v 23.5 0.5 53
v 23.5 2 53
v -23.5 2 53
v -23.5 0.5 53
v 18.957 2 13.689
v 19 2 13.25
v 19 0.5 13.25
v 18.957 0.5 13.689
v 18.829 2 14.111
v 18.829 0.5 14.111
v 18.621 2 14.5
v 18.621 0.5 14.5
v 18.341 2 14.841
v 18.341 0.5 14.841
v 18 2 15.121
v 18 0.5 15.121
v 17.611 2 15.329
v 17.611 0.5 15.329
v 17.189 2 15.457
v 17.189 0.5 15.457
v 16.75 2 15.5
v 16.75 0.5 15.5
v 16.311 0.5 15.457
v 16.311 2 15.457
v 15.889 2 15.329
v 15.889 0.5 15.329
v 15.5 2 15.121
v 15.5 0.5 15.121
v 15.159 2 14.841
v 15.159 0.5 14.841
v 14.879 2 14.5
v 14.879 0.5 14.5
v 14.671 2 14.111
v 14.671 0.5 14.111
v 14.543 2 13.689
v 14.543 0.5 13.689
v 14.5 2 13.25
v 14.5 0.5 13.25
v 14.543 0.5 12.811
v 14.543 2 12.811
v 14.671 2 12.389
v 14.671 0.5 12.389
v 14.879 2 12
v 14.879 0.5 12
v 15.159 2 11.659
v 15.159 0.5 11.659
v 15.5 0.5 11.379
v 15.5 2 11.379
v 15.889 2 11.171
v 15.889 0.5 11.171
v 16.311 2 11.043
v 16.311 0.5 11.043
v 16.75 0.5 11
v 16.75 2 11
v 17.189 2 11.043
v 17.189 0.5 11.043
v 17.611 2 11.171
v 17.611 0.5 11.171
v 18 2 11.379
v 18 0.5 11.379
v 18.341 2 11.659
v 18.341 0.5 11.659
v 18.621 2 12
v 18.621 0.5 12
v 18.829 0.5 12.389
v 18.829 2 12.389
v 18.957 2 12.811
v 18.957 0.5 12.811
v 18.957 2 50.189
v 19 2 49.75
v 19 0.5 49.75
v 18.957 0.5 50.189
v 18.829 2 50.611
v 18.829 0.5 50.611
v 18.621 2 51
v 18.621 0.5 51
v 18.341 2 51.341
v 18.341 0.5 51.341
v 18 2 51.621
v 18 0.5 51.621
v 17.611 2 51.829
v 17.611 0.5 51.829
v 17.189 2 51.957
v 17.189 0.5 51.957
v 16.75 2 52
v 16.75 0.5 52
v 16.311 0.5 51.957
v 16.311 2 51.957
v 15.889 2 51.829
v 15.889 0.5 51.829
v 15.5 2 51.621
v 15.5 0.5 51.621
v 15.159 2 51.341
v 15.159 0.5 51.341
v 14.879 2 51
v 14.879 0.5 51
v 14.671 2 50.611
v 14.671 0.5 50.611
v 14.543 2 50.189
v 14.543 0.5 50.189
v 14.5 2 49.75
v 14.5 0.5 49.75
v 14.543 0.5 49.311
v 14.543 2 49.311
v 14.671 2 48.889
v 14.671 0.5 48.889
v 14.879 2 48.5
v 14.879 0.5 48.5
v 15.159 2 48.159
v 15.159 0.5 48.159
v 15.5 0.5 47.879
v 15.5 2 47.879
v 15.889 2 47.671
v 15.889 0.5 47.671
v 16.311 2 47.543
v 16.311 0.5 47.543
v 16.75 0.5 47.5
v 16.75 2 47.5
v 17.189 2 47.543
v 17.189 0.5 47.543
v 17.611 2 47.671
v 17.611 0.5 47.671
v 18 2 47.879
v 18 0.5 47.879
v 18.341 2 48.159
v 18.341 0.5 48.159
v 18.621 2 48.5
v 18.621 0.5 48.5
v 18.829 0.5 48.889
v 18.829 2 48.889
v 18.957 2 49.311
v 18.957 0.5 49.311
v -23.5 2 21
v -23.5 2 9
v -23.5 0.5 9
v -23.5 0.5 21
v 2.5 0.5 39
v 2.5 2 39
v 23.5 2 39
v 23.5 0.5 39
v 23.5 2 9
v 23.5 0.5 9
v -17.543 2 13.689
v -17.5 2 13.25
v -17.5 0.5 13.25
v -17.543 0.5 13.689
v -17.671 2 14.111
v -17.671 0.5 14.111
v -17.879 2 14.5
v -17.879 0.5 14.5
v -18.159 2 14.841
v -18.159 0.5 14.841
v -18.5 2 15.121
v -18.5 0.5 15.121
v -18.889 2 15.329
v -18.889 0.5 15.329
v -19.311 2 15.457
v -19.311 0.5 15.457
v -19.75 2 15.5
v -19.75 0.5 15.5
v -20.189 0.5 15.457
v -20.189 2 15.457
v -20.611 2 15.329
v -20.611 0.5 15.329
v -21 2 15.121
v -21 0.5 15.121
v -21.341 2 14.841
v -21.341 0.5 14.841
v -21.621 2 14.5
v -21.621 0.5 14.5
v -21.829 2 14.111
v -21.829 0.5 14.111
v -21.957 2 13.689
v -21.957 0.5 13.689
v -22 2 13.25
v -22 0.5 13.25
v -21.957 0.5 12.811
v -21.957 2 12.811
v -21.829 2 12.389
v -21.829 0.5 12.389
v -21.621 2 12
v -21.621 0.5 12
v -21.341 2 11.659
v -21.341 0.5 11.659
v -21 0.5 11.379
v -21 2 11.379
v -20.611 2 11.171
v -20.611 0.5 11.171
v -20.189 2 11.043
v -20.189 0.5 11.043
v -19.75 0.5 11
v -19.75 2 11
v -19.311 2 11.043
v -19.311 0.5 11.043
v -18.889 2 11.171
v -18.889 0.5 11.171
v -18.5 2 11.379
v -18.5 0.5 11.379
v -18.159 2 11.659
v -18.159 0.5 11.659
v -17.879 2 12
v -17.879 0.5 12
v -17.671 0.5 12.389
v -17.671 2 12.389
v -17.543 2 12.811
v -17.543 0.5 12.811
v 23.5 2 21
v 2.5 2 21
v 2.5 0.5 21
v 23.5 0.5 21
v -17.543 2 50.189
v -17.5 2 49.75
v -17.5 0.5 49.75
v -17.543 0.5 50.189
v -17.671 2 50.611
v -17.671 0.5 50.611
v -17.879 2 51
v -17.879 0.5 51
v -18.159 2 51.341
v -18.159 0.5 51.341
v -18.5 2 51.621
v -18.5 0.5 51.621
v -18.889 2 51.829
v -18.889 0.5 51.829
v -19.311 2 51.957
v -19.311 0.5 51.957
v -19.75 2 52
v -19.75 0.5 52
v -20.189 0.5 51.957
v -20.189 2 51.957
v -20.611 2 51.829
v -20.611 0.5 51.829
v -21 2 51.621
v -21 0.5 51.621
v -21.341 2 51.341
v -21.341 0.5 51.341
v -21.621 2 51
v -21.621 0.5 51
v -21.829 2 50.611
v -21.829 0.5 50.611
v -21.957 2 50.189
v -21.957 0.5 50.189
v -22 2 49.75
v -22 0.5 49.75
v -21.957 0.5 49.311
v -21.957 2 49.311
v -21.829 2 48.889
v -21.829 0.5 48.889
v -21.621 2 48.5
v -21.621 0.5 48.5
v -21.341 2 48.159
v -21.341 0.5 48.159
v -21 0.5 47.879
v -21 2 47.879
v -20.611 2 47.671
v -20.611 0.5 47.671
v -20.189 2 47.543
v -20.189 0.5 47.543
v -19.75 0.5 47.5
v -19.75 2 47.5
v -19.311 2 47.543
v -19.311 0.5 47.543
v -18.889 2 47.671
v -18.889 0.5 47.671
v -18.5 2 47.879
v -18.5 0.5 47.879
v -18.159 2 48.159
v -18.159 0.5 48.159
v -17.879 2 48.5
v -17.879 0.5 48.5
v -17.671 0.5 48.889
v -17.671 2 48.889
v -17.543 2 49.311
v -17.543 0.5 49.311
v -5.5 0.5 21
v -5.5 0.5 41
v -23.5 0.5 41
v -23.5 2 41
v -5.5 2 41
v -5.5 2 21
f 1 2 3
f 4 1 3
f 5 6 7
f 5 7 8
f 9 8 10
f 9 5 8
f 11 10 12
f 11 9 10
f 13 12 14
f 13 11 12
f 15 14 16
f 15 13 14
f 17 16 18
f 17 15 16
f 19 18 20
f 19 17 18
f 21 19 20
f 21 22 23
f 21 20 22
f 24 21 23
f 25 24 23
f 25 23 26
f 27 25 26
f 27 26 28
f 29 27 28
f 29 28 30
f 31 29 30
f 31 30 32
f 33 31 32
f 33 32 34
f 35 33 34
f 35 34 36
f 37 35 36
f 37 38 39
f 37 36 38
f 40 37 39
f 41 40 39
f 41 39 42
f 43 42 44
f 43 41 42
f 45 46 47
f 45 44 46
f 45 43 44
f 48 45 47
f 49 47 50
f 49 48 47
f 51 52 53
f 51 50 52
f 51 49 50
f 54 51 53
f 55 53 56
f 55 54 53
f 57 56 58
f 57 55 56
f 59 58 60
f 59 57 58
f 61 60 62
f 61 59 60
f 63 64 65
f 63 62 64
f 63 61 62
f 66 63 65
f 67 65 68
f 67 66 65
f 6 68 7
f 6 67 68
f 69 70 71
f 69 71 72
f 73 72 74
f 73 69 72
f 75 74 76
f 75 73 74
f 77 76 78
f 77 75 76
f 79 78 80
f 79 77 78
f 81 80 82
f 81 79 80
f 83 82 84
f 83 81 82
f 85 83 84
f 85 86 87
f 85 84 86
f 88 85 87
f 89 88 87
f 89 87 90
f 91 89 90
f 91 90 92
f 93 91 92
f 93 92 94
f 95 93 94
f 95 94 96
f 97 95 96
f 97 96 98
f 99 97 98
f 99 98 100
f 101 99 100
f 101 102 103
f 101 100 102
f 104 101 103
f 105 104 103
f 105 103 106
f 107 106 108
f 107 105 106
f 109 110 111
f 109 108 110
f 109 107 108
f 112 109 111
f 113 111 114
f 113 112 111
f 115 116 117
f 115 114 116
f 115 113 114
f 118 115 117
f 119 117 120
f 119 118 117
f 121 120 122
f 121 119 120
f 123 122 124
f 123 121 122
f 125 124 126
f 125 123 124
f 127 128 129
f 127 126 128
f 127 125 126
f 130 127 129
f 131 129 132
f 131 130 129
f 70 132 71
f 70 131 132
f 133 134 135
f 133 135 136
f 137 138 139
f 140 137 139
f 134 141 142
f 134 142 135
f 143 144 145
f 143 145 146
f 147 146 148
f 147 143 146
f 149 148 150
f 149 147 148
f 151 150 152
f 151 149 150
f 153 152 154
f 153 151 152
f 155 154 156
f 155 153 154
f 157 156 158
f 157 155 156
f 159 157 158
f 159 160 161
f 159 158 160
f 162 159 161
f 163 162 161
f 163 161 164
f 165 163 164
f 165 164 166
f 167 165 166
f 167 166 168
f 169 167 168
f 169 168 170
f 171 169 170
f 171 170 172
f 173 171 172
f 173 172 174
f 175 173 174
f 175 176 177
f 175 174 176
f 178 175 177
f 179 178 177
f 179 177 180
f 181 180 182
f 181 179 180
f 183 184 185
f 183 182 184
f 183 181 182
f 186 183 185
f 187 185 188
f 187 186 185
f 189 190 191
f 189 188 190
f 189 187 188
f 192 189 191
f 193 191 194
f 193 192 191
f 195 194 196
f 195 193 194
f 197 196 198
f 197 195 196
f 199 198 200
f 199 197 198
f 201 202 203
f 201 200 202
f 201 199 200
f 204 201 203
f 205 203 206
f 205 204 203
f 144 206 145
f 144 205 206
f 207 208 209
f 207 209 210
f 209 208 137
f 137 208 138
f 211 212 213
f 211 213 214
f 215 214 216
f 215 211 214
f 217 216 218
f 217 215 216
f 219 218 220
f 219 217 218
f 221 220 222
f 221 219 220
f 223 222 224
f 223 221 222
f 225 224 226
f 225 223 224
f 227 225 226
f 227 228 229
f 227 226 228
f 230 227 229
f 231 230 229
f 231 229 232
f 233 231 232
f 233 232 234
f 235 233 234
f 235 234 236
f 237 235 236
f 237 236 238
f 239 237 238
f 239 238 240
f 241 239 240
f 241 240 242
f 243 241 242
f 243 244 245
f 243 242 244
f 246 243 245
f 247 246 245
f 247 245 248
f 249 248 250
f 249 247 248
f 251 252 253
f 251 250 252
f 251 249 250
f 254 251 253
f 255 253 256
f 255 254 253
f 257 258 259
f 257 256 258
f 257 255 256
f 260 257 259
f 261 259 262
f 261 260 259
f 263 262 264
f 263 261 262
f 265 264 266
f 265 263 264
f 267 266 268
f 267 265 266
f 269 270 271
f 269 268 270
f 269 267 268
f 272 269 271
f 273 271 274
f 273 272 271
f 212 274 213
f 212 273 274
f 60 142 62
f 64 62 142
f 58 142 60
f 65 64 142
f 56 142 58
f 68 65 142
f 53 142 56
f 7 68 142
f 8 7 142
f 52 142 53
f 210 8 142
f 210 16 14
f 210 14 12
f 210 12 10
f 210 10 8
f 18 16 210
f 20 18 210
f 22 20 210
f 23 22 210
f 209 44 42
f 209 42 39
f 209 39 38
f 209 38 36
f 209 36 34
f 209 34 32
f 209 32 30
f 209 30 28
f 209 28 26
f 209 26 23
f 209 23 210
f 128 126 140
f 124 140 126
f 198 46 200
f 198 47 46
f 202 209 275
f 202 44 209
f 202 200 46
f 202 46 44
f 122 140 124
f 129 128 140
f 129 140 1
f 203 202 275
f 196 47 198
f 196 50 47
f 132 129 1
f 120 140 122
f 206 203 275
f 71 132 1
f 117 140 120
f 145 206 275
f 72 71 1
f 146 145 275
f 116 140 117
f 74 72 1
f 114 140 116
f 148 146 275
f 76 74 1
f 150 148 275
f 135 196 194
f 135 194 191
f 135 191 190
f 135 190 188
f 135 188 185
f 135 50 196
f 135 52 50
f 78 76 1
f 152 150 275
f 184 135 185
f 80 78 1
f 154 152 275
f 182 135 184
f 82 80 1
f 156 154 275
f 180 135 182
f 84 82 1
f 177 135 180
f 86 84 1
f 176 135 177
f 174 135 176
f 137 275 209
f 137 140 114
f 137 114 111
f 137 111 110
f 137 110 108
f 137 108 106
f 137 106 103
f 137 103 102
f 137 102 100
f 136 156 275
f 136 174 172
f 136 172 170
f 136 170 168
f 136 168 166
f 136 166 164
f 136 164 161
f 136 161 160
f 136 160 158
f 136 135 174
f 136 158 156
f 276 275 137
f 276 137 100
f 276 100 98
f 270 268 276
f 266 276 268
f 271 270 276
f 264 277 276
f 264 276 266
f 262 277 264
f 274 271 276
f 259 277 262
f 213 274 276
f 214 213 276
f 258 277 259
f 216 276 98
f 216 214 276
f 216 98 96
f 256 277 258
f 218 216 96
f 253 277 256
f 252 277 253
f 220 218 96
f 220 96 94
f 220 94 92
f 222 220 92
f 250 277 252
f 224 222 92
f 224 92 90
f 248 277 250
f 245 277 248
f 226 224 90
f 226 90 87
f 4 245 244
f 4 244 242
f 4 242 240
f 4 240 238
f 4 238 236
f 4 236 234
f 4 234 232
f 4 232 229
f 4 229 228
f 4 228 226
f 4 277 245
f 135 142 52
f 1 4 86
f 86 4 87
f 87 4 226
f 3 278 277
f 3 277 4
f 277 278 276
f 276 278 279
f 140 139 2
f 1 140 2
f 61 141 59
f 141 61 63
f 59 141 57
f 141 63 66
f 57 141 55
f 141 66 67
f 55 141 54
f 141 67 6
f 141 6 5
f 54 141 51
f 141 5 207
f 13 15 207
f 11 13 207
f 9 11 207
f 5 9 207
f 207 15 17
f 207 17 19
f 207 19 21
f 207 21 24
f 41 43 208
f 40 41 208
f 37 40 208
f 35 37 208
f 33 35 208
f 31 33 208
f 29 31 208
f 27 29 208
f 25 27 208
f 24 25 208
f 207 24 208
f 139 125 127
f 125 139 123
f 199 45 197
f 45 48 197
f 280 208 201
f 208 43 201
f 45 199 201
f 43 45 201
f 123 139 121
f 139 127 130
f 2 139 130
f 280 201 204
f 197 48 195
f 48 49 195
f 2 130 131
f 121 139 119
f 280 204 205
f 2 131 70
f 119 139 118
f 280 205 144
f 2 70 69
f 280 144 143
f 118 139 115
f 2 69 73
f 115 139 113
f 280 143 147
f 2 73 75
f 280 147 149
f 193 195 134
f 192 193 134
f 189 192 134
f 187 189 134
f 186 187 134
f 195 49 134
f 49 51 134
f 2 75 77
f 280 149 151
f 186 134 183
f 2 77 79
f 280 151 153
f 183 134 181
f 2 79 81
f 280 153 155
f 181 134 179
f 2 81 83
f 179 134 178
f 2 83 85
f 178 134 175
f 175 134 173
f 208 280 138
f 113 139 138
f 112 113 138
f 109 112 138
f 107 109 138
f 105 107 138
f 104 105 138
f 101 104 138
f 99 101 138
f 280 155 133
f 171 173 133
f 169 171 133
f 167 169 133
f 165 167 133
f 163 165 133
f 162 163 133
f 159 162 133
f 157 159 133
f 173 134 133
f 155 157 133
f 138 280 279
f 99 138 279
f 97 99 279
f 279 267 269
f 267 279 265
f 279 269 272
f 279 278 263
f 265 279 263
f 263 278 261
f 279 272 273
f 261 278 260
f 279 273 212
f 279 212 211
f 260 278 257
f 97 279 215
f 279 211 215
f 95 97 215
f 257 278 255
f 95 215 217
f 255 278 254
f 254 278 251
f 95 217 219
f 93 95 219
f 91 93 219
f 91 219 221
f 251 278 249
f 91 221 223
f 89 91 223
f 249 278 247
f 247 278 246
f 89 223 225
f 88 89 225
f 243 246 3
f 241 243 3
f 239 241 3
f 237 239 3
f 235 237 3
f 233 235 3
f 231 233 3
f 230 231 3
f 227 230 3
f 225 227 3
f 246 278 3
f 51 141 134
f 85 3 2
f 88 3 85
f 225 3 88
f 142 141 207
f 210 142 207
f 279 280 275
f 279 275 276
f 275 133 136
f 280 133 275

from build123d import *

# Parameters (mm, degrees)
BOX002_W               = 21
BOX002_H               = 18
BOX002_DEPTH           = 10
BOX001_W               = 18
BOX001_H               = 20
BOX001_DEPTH           = 10
CYLINDER002_R          = 2.25
CYLINDER002_DEPTH      = 10
CYLINDER003_R          = 2.25
CYLINDER003_DEPTH      = 10
CYLINDER004_R          = 2.25
CYLINDER004_DEPTH      = 10
CYLINDER005_R          = 2.25
CYLINDER005_DEPTH      = 10
BOX_W                  = 44
BOX_H                  = 47
BOX_DEPTH              = 1.5
CUT001_PLACEMENT_ANGLE = 90


with BuildPart() as w_rfel002:
    # Box002 → Box002 (new body)
    with BuildSketch(Plane(origin=(-21, 12, -1), x_dir=(1, 0, 0), z_dir=(0, 0, 1))):
        with Locations((10.5, 9)):
            Rectangle(BOX002_W, BOX002_H)
    extrude(amount=BOX002_DEPTH)


with BuildPart() as compound001:
    # Box001 → Box001 (new body)
    with BuildSketch(Plane(origin=(-47, 12, -1), x_dir=(1, 0, 0), z_dir=(0, 0, 1))):
        with Locations((9, 10)):
            Rectangle(BOX001_W, BOX001_H)
    extrude(amount=BOX001_DEPTH)

    # Compound001: union Würfel002
    add(w_rfel002.part)


with BuildPart() as zylinder002:
    # Cylinder002 → Cylinder002 (new body)
    with BuildSketch(Plane(origin=(-6.75, 4.25, -1), x_dir=(1, 0, 0), z_dir=(0, 0, 1))):
        Circle(CYLINDER002_R)
    extrude(amount=CYLINDER002_DEPTH)


with BuildPart() as zylinder003:
    # Cylinder003 → Cylinder003 (new body)
    with BuildSketch(Plane(origin=(-43.25, 4.25, -1), x_dir=(1, 0, 0), z_dir=(0, 0, 1))):
        Circle(CYLINDER003_R)
    extrude(amount=CYLINDER003_DEPTH)


with BuildPart() as zylinder004:
    # Cylinder004 → Cylinder004 (new body)
    with BuildSketch(Plane(origin=(-6.75, 40.75, -1), x_dir=(1, 0, 0), z_dir=(0, 0, 1))):
        Circle(CYLINDER004_R)
    extrude(amount=CYLINDER004_DEPTH)


with BuildPart() as compound:
    # Cylinder005 → Cylinder005 (new body)
    with BuildSketch(Plane(origin=(-43.25, 40.75, -1), x_dir=(1, 0, 0), z_dir=(0, 0, 1))):
        Circle(CYLINDER005_R)
    extrude(amount=CYLINDER005_DEPTH)

    # Compound: union Zylinder002, Zylinder003, Zylinder004
    add(zylinder002.part)
    add(zylinder003.part)
    add(zylinder004.part)


with BuildPart() as cut001:
    # Box → Box (new body)
    with BuildSketch(Plane(origin=(0, 0, 0), x_dir=(0, 1, 0), z_dir=(0, 0, 1))):
        with Locations((22, 23.5)):
            Rectangle(BOX_W, BOX_H)
    extrude(amount=BOX_DEPTH)

    # Cut: cut Compound
    add(compound.part, mode=Mode.SUBTRACT)

    # Cut001: cut Compound001
    add(compound001.part, mode=Mode.SUBTRACT)


with BuildPart() as cut001_1:
    # Cut001 placement: moved
    add(cut001.part.moved(Location((23.5, 2, 9))).rotate(Axis((23.5, 2, 9), (1, 0, 0)), CUT001_PLACEMENT_ANGLE))


solid = cut001_1.part
